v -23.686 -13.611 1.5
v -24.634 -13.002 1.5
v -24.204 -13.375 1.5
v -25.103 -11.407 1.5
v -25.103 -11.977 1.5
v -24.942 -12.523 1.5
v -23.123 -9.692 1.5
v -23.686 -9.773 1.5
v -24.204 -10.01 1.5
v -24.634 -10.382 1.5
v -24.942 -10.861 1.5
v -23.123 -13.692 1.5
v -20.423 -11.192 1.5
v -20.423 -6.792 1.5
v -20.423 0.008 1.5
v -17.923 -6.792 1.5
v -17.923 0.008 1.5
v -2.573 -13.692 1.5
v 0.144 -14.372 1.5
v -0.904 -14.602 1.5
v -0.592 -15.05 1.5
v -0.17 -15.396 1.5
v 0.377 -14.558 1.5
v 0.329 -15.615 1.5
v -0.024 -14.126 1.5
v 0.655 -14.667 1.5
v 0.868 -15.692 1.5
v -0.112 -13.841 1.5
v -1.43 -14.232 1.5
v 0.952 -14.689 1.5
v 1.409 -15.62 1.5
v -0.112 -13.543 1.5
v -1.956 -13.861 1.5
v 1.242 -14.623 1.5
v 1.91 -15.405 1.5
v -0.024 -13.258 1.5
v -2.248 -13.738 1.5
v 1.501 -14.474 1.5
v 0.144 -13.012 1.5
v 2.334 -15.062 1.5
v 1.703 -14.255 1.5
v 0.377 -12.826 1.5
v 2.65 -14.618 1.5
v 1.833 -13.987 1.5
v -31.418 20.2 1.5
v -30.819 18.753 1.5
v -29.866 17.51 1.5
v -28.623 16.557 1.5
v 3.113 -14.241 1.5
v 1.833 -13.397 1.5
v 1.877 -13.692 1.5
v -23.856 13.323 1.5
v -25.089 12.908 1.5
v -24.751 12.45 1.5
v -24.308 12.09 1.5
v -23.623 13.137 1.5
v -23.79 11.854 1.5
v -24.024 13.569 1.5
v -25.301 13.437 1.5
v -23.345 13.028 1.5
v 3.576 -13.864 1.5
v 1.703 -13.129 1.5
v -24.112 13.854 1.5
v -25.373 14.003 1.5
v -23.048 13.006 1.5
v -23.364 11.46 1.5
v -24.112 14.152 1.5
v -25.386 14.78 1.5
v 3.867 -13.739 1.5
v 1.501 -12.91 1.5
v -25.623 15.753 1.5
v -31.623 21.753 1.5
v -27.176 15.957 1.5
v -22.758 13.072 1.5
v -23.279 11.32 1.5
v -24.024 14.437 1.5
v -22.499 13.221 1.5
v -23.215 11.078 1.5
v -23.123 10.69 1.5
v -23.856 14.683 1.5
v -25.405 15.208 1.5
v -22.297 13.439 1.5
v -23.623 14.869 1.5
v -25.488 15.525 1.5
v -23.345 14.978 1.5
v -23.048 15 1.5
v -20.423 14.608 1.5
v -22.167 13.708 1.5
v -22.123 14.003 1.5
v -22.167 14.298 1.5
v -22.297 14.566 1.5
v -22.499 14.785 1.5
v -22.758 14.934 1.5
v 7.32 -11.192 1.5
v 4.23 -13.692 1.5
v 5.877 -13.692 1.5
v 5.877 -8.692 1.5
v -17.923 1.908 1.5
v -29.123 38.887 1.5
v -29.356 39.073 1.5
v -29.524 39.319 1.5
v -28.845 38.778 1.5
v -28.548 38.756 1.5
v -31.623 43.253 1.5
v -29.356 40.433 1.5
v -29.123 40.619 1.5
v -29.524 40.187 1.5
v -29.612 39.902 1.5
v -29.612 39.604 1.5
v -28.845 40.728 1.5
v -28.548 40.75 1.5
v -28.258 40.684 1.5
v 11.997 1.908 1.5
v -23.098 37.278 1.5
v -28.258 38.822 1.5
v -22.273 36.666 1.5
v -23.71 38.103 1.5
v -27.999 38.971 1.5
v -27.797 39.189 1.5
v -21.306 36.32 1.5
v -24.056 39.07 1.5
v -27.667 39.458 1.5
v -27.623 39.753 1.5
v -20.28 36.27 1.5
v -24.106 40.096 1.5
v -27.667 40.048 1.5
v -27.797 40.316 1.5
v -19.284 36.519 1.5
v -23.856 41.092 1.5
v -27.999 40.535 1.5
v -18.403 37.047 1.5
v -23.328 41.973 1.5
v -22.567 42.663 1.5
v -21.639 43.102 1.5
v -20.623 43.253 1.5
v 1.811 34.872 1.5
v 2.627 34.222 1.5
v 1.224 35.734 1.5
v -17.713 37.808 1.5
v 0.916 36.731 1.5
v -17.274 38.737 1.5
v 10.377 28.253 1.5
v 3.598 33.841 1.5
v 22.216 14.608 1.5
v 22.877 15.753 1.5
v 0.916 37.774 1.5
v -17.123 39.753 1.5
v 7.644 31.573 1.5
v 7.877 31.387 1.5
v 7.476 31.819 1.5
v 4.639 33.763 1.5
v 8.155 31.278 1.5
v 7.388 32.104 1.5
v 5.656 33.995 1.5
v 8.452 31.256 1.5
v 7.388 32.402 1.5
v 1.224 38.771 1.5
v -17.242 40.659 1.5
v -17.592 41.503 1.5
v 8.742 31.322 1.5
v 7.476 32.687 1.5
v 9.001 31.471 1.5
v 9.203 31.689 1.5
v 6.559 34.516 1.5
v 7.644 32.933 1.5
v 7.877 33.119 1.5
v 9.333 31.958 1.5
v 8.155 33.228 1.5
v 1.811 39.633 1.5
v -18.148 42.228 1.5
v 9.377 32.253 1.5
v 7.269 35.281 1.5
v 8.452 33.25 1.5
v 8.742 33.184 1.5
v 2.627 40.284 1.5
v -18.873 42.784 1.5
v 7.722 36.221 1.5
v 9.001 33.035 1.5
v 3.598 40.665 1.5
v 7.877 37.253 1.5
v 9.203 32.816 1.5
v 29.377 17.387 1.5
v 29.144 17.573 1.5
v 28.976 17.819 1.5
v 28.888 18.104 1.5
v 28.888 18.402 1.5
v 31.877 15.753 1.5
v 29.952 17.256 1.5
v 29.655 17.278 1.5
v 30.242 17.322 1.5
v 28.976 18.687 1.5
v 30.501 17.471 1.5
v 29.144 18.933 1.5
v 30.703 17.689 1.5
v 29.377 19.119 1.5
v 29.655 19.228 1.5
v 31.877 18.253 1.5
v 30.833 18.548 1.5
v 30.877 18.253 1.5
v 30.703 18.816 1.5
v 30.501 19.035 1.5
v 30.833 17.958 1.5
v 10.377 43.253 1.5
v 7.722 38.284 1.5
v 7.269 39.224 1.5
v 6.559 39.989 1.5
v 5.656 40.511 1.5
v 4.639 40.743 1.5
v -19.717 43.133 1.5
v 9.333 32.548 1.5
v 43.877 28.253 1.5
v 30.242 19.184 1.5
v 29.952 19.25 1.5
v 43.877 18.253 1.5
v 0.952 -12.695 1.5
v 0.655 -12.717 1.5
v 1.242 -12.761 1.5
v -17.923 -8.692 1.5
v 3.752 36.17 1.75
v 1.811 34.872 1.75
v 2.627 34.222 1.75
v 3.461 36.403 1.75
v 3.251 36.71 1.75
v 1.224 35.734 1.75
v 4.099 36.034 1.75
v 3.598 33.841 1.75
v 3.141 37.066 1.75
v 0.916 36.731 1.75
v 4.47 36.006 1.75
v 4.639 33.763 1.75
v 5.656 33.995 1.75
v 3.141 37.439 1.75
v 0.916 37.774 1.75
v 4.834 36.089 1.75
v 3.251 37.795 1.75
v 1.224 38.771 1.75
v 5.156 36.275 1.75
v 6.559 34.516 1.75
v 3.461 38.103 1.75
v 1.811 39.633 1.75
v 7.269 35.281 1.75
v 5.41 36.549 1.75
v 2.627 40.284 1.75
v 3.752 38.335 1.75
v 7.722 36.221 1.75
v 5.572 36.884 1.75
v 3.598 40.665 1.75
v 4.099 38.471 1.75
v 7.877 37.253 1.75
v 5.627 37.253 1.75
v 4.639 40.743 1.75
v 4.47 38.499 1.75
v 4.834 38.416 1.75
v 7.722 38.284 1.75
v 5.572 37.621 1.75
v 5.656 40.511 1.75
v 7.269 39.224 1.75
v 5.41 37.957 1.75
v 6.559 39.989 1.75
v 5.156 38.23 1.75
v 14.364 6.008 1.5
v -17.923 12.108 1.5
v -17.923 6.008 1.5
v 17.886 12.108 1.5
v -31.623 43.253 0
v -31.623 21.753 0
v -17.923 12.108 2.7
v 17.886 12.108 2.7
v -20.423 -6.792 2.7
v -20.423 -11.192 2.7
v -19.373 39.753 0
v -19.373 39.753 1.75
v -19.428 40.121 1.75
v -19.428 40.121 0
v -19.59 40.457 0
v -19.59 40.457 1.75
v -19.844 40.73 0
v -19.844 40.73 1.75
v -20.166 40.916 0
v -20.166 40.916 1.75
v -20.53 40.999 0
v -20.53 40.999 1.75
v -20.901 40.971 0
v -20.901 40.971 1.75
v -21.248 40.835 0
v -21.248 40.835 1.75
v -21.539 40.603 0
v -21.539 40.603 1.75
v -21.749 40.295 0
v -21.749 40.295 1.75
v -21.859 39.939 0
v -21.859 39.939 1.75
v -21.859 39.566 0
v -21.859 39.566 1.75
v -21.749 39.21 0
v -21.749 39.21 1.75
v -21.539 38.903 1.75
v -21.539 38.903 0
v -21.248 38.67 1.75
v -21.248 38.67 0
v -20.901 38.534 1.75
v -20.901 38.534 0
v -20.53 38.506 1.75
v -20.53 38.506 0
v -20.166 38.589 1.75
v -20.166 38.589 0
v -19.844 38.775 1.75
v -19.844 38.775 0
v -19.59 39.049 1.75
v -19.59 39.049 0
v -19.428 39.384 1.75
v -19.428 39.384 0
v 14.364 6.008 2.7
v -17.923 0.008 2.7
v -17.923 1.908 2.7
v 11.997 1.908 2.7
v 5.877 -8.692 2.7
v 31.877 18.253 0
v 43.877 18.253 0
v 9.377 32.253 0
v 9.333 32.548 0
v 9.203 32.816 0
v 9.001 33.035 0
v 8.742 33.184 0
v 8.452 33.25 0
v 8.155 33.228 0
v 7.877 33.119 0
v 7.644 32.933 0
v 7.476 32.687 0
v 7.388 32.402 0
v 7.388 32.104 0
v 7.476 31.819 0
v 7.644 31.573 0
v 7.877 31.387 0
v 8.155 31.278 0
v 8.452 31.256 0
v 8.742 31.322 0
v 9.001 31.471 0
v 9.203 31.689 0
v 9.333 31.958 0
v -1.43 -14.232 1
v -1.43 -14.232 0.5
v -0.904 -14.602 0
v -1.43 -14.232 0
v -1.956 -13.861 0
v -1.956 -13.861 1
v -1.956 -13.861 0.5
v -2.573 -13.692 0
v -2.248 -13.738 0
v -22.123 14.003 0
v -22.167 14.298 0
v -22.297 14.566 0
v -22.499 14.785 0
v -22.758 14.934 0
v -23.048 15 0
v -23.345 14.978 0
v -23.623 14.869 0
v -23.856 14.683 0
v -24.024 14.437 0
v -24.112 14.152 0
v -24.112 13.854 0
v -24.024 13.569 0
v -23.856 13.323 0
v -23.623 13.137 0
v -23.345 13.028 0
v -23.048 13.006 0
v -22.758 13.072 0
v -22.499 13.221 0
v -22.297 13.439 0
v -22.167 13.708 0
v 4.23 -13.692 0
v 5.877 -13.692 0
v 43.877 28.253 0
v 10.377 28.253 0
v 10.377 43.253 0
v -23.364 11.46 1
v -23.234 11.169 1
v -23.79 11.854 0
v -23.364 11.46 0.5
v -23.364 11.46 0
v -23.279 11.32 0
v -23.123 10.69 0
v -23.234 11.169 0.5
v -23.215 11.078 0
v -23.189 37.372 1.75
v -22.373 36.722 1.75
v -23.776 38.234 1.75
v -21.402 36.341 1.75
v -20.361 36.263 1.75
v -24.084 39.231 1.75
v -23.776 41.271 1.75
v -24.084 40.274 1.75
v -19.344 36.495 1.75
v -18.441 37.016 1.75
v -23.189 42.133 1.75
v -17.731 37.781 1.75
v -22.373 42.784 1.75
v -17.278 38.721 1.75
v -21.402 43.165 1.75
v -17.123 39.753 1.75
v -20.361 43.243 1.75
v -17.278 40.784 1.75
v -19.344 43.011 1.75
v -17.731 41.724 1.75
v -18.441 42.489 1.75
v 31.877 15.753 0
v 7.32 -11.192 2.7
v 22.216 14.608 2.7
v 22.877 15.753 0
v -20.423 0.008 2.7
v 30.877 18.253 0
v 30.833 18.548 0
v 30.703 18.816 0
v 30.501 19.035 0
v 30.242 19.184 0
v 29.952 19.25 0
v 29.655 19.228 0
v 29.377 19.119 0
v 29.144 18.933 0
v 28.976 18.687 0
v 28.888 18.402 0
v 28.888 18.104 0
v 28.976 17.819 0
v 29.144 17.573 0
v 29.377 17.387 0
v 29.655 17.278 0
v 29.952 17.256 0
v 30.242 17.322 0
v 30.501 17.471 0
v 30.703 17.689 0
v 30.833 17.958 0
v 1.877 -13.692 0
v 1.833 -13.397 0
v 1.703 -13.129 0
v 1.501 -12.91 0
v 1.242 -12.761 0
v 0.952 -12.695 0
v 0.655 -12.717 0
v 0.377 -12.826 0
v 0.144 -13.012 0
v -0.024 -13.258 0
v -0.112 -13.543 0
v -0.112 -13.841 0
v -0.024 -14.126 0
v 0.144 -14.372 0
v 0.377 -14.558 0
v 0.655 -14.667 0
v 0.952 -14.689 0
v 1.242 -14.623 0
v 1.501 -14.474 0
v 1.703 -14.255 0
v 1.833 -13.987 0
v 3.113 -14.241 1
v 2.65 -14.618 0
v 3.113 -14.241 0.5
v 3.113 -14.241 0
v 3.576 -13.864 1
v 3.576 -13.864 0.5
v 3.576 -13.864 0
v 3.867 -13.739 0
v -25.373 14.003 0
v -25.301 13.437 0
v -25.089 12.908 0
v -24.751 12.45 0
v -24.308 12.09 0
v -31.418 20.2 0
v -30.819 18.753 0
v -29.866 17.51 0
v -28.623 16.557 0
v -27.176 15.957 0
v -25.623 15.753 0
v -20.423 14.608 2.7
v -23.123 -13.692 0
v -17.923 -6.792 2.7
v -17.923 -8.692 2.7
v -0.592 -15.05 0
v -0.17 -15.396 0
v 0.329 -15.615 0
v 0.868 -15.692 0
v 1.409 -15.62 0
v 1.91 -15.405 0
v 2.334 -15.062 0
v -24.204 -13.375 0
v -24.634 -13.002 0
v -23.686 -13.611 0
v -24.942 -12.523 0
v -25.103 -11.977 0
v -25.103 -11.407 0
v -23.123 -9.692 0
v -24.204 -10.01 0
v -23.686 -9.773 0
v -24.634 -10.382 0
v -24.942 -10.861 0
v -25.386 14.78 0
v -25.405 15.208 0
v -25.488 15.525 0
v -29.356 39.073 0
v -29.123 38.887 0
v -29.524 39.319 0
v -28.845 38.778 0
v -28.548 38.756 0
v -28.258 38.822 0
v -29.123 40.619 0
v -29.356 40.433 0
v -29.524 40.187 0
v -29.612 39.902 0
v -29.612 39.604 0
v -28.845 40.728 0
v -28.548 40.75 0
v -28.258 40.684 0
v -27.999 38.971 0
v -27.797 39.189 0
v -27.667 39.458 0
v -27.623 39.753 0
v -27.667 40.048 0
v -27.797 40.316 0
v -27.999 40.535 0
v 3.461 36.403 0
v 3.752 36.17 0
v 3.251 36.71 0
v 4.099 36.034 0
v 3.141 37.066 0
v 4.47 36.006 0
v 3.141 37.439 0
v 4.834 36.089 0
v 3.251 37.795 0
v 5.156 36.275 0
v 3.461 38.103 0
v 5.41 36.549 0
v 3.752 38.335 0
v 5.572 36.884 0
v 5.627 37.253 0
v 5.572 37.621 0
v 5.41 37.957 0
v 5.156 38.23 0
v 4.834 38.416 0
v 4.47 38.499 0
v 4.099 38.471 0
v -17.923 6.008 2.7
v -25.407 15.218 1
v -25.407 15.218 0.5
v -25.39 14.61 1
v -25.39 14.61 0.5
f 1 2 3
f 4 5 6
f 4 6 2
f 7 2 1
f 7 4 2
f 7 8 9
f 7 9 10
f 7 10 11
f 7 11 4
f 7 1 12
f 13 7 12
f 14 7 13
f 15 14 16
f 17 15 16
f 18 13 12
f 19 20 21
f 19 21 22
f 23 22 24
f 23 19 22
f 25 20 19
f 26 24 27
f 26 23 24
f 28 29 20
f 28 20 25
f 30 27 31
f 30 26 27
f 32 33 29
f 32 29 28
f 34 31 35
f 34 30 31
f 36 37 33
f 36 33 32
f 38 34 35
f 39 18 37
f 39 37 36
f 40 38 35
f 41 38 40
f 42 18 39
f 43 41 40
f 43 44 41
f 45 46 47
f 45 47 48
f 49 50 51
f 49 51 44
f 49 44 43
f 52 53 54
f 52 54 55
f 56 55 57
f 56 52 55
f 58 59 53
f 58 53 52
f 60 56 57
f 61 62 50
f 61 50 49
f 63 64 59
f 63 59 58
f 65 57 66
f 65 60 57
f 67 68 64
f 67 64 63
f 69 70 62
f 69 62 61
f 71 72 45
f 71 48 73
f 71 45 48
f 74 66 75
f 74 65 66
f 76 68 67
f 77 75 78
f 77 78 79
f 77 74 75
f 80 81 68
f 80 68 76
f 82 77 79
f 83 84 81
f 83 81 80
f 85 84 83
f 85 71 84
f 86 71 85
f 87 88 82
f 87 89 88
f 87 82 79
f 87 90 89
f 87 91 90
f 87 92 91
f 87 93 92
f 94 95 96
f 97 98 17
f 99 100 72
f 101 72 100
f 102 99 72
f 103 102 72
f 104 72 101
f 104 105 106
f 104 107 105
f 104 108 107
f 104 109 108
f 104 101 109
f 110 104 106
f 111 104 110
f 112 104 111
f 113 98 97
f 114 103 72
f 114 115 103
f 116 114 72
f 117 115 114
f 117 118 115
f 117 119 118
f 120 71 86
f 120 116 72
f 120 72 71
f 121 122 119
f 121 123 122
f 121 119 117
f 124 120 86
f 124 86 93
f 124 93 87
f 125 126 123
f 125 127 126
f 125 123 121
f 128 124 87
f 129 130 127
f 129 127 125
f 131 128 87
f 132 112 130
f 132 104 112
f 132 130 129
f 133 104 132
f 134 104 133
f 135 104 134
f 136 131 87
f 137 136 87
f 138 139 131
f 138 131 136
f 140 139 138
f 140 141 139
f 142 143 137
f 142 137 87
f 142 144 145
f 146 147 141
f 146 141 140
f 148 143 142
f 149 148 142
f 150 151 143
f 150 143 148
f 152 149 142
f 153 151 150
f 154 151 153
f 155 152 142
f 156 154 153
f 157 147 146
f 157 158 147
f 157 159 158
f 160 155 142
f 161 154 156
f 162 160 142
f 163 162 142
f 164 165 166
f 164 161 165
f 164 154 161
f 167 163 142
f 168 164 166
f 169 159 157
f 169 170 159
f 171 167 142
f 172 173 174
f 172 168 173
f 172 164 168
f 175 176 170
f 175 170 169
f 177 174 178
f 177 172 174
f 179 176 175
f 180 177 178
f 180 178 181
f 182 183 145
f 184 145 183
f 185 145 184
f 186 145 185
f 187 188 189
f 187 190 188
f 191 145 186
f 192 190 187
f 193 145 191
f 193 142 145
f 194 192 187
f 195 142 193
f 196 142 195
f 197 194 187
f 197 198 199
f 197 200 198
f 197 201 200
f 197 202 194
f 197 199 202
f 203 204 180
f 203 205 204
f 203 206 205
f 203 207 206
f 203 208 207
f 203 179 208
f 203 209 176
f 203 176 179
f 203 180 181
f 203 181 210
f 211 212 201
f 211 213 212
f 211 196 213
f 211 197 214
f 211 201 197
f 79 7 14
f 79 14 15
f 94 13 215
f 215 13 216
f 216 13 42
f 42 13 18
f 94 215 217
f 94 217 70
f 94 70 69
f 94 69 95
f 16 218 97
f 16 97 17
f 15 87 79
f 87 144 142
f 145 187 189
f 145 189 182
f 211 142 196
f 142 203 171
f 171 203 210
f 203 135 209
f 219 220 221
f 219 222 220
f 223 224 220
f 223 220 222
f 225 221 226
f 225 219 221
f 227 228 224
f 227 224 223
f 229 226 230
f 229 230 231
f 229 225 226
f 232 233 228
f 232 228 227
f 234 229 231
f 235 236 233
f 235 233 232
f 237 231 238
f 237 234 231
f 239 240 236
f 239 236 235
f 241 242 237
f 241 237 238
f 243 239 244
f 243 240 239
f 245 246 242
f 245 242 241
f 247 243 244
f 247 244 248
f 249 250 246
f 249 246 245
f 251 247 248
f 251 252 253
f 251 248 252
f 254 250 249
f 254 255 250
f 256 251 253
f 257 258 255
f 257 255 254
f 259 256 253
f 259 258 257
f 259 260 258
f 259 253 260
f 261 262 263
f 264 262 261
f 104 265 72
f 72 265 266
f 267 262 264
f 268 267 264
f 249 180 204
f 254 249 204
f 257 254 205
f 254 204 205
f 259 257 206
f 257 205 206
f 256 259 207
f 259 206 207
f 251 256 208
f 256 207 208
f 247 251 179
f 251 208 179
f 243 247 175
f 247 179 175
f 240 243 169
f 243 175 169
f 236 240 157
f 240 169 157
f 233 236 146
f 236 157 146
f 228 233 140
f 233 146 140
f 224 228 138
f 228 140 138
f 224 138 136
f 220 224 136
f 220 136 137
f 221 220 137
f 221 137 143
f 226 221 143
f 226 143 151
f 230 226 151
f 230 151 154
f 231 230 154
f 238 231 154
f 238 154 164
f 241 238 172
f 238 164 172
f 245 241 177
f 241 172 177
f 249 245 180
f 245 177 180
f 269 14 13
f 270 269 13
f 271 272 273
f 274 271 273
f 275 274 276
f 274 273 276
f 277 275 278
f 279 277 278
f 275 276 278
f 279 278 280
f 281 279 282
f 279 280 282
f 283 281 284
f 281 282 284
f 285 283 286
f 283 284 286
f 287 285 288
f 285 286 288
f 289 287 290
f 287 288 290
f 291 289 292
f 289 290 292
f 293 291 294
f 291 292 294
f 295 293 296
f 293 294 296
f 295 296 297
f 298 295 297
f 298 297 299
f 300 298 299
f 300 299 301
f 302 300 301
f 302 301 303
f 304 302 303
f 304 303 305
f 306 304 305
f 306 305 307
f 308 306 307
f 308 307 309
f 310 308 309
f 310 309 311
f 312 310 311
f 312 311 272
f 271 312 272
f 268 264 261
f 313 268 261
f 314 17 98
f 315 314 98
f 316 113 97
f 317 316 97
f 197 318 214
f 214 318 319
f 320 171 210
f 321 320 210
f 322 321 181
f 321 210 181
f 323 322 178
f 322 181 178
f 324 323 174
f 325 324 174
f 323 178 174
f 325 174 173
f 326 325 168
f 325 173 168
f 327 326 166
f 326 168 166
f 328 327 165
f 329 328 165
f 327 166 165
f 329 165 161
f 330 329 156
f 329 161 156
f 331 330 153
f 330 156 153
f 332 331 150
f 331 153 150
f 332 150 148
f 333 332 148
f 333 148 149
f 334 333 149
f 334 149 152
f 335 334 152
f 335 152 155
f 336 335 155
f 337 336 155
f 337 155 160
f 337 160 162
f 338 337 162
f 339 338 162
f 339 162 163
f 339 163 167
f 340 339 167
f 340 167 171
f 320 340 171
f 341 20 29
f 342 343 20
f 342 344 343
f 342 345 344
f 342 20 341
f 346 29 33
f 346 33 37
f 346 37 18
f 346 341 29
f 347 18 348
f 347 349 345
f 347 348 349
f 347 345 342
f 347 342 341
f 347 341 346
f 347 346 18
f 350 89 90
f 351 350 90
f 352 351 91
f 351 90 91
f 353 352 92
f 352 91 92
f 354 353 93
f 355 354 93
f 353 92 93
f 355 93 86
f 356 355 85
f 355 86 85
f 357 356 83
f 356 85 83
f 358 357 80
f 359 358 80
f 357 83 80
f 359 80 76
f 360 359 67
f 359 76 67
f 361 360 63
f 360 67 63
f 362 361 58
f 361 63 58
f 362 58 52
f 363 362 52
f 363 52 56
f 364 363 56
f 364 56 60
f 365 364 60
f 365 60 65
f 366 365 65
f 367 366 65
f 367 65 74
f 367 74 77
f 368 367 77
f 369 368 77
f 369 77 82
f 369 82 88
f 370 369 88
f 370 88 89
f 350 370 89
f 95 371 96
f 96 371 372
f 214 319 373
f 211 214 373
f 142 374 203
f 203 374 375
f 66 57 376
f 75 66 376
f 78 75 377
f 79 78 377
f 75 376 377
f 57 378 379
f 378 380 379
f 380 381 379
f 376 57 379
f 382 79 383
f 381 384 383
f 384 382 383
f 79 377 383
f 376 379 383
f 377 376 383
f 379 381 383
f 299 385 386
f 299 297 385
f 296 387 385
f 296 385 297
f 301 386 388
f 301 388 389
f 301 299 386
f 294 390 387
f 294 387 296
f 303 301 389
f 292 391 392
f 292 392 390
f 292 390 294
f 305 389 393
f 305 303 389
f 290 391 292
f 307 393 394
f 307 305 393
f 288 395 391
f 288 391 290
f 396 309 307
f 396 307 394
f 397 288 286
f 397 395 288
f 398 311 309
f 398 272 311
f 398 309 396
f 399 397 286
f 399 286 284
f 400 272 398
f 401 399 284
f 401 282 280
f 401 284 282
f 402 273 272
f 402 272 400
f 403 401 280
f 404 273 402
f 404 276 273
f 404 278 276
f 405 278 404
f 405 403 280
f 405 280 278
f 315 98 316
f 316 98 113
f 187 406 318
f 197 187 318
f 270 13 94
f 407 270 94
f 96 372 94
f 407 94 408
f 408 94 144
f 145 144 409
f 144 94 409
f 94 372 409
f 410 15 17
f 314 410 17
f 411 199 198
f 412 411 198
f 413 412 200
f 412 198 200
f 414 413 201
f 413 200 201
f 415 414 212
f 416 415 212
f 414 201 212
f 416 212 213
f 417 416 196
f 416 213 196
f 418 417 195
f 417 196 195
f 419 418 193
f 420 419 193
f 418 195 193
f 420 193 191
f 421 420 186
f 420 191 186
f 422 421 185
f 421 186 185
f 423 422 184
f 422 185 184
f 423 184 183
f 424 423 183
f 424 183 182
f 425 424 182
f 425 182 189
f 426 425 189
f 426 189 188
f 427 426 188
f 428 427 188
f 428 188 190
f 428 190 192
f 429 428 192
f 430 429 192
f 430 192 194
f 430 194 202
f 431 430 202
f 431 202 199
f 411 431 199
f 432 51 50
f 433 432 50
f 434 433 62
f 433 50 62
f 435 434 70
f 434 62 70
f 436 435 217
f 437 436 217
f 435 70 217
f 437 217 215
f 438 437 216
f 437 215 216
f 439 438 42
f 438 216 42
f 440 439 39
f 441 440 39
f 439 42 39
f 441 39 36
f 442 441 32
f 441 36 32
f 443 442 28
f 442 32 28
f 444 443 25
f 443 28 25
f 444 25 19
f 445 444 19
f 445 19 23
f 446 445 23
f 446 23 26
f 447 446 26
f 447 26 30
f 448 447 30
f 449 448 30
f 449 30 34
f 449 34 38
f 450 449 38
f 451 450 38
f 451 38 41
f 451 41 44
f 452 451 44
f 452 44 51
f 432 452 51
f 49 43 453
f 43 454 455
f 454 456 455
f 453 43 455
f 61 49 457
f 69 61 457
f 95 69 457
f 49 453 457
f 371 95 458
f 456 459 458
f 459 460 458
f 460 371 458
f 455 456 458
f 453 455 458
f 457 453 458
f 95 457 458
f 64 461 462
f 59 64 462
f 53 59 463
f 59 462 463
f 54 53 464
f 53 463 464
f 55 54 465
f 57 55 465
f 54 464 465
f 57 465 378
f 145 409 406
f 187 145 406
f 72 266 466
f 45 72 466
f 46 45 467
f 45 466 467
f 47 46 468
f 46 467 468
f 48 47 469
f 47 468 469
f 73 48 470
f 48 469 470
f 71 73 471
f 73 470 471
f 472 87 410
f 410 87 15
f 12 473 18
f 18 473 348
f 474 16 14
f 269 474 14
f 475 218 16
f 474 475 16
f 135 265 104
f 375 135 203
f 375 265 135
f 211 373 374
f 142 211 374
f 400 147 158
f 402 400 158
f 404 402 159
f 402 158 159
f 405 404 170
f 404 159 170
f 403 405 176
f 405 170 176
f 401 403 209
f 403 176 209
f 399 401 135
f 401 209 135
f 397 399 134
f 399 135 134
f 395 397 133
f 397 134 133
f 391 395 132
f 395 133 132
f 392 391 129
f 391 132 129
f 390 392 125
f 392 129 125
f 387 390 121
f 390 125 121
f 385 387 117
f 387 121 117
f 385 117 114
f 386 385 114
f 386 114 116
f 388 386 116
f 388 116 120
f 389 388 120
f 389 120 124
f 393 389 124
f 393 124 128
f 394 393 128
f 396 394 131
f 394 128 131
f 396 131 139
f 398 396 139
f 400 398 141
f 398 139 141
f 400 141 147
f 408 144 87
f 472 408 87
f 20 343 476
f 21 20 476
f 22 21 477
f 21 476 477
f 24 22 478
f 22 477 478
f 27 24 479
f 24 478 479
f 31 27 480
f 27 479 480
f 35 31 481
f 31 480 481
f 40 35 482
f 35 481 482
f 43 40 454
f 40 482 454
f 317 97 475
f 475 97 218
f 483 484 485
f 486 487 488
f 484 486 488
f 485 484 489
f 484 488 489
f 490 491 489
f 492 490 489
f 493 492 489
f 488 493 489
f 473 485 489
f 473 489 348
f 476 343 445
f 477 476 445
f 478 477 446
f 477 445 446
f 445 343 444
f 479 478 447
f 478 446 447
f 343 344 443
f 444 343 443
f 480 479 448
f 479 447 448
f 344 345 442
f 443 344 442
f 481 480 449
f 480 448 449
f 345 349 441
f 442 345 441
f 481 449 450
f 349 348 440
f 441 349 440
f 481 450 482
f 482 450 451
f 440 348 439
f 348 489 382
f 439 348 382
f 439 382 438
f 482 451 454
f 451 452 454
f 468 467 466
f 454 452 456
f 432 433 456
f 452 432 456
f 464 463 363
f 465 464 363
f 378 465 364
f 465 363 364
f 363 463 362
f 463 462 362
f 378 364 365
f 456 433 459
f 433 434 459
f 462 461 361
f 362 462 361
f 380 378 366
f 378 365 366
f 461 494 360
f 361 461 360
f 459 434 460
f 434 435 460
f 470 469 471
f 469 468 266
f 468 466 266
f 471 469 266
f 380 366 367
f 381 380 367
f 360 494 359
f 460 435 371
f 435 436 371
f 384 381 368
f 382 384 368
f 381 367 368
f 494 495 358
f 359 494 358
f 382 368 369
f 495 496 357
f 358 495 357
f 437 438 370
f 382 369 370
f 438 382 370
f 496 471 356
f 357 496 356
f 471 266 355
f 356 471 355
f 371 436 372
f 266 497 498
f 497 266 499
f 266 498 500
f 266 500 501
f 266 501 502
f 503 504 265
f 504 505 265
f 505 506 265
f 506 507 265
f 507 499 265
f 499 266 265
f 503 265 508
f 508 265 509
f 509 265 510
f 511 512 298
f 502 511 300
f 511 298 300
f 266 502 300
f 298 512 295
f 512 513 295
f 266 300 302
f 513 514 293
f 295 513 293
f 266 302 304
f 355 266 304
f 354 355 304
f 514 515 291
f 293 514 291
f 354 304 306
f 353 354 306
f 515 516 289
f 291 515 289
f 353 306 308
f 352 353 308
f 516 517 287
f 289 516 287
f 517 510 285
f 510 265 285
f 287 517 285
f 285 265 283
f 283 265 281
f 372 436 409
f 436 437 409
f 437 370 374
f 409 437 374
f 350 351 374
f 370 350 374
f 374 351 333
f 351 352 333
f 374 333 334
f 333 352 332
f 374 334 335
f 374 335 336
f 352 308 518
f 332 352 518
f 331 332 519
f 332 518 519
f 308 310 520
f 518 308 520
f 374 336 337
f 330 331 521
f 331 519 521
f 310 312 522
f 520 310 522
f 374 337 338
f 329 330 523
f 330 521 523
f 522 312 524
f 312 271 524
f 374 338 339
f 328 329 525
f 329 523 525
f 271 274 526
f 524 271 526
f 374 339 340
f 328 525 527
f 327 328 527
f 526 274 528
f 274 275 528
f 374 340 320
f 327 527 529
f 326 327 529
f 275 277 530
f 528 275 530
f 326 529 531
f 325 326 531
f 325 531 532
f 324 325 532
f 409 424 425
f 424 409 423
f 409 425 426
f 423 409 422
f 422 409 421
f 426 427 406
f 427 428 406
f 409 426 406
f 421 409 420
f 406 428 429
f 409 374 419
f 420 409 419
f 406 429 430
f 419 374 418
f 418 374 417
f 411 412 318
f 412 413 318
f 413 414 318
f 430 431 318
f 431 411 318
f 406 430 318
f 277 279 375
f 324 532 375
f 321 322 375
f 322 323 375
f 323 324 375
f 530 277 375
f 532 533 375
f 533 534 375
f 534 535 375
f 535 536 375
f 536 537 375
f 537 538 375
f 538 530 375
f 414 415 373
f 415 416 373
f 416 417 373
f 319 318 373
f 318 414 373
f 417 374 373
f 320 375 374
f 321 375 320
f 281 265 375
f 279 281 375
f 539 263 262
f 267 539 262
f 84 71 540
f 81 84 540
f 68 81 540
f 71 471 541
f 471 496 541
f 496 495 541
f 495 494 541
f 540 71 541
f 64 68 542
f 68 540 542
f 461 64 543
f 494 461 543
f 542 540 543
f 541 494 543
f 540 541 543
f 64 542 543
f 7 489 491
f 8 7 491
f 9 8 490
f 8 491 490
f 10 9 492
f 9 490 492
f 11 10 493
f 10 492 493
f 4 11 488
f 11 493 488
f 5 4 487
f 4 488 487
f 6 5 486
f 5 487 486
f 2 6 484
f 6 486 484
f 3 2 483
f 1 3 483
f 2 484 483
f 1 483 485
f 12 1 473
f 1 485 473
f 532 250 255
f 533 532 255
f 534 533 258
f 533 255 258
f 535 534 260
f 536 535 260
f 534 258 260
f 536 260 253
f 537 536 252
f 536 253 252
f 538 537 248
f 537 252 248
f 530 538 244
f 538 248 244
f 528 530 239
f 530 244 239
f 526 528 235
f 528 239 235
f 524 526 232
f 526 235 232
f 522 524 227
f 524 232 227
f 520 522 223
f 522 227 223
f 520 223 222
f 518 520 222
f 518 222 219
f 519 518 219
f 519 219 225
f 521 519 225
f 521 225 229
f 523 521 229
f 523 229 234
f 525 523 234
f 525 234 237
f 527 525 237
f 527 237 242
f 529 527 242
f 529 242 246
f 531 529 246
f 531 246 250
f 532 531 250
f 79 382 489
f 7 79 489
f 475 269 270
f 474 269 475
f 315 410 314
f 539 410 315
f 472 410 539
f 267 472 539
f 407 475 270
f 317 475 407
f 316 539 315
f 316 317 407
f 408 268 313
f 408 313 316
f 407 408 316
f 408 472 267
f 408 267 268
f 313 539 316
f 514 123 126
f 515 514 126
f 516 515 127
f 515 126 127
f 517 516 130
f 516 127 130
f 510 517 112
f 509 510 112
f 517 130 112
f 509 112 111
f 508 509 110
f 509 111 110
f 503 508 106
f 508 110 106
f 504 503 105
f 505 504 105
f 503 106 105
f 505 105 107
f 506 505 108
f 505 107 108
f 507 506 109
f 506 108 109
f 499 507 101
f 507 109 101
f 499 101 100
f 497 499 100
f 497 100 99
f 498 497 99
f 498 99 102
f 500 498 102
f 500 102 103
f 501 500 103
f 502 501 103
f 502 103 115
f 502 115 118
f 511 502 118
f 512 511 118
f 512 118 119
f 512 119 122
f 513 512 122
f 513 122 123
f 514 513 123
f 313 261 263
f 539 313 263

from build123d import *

# Parameters (mm, degrees)
F0_W     = 42
F0_H     = 15
F1_DEPTH = 1.5
F2_R     = 3.5
F3_DEPTH = 0.25
F4_R     = 1.25
F5_DEPTH = 5
F6_R     = 1
F7_DEPTH = 5
F9_DEPTH = 1.2


with BuildPart() as f1:
    # F0 (on Top) → F1 (new body)
    with BuildSketch(Plane.XY):
        with Locations((-10.6229138038, 35.7527500853)):
            Rectangle(F0_W, F0_H)
        with BuildLine():
            Line((10.3770861962, 18.2527500853), (10.3770861962, 28.2527500853))
            Line((10.3770861962, 28.2527500853), (-31.6229138038, 28.2527500853))
            Line((-31.6229138038, 28.2527500853), (-31.6229138038, 21.7527500853))
            ThreePointArc((-31.6229138038, 21.7527500853), (-29.8655544909, 17.5101093982), (-25.6229138038, 15.7527500853))
            Line((-25.6229138038, 15.7527500853), (-24.5371273662, 15.7527500853))
            Line((-24.5371273662, 15.7527500853), (-23.1229138038, 15.7527500853))
            Line((-23.1229138038, 15.7527500853), (5.8770861962, 15.7527500853))
            Line((5.8770861962, 15.7527500853), (10.3770861962, 15.7527500853))
            Line((10.3770861962, 15.7527500853), (10.3770861962, 18.2527500853))
        make_face()
        Polygon((43.8770861962, 28.2527500853), (10.3770861962, 28.2527500853), (10.3770861962, 18.2527500853), (31.8770861962, 18.2527500853), (43.8770861962, 18.2527500853), align=None)
        Polygon((31.8770861962, 18.2527500853), (10.3770861962, 18.2527500853), (10.3770861962, 15.7527500853), (22.8770861962, 15.7527500853), (31.8770861962, 15.7527500853), align=None)
        Polygon((22.8770861962, 15.7527500853), (10.3770861962, 15.7527500853), (5.8770861962, 15.7527500853), (5.8770861962, -13.6921136433), align=None)
        Polygon((5.8770861962, -13.6921136433), (5.8770861962, 15.7527500853), (-23.1229138038, 15.7527500853), (-23.1229138038, 11.7527500853), (-23.1229138038, 10.6903063133), (-23.1229138038, -9.6921136433), (-23.1229138038, -13.6921136433), (-2.5732517242, -13.6921136433), (-1.1229138038, -13.6921136433), (2.8770861962, -13.6921136433), (4.2299595661, -13.6921136433), align=None)
        with BuildLine():
            Line((-24.5371273662, 15.7527500853), (-25.6229138038, 15.7527500853))
            add(Edge.make_bspline(
                [(-25.6229138038, 15.7527500853), (-25.2405945212, 15.277672559), (-25.4562471371, 14.5860834187), (-25.3729138038, 14.0027500853)],
                knots=[0, 0, 0, 0, 1.767766953, 1.767766953, 1.767766953, 1.767766953], degree=3))
            ThreePointArc((-25.3729138038, 14.0027500853), (-25.1532438897, 14.9724199994), (-24.5371273662, 15.7527500853))
        make_face()
        with BuildLine():
            Line((-23.1229138038, 11.7527500853), (-23.1229138038, 15.7527500853))
            Line((-23.1229138038, 15.7527500853), (-24.5371273662, 15.7527500853))
            ThreePointArc((-24.5371273662, 15.7527500853), (-25.1532438897, 14.9724199994), (-25.3729138038, 14.0027500853))
            ThreePointArc((-25.3729138038, 14.0027500853), (-24.934409558, 12.6682152852), (-23.7898176859, 11.8538575305))
            ThreePointArc((-23.7898176859, 11.8538575305), (-23.4601761288, 11.7781705466), (-23.1229138038, 11.7527500853))
        make_face()
        with BuildLine():
            Line((-23.1229138038, -13.6921136433), (-23.1229138038, -9.6921136433))
            ThreePointArc((-23.1229138038, -9.6921136433), (-25.1229138038, -11.6921136433), (-23.1229138038, -13.6921136433))
        make_face()
        with BuildLine():
            add(Edge.make_bspline(
                [(2.6500229876, -14.6176919133), (3.1772305838, -14.3094592572), (3.4171862062, -13.6921136433), (4.2299595661, -13.6921136433)],
                knots=[0, 0, 0, 0, 1.8310911299, 1.8310911299, 1.8310911299, 1.8310911299], degree=3))
            Line((4.2299595661, -13.6921136433), (2.8770861962, -13.6921136433))
            ThreePointArc((2.8770861962, -13.6921136433), (2.8194910951, -14.1686251423), (2.6500229876, -14.6176919133))
        make_face()
        with BuildLine():
            ThreePointArc((2.6500229876, -14.6176919133), (2.8194910951, -14.1686251423), (2.8770861962, -13.6921136433))
            Line((2.8770861962, -13.6921136433), (-1.1229138038, -13.6921136433))
            ThreePointArc((-1.1229138038, -13.6921136433), (-1.0673522064, -14.1602581707), (-0.9037545054, -14.6023918402))
            ThreePointArc((-0.9037545054, -14.6023918402), (0.8684756789, -15.692095108), (2.6500229876, -14.6176919133))
        make_face()
        with BuildLine():
            ThreePointArc((-0.9037545054, -14.6023918402), (-1.0673522064, -14.1602581707), (-1.1229138038, -13.6921136433))
            Line((-1.1229138038, -13.6921136433), (-2.5732517242, -13.6921136433))
            add(Edge.make_bspline(
                [(-0.9037545054, -14.6023918402), (-1.4608021595, -14.2992461823), (-1.8808895256, -13.6921136433), (-2.5732517242, -13.6921136433)],
                knots=[0, 0, 0, 0, 1.9015328973, 1.9015328973, 1.9015328973, 1.9015328973], degree=3))
        make_face()
        with BuildLine():
            Line((-23.1229138038, 10.6903063133), (-23.1229138038, 11.7527500853))
            ThreePointArc((-23.1229138038, 11.7527500853), (-23.4601761288, 11.7781705466), (-23.7898176859, 11.8538575305))
            add(Edge.make_bspline(
                [(-23.7898176859, 11.8538575305), (-23.1229138038, 11.3115124404), (-23.3172457665, 11.3592976704), (-23.1229138038, 10.6903063133)],
                knots=[0, 0, 0, 0, 1.3411234928, 1.3411234928, 1.3411234928, 1.3411234928], degree=3))
        make_face()
    extrude(amount=F1_DEPTH)

    # F2 (on face) → F3 (join)
    with BuildSketch(Plane.XY.offset(1.5)):
        with Locations((-20.6229138038, 39.7527500853)):
            Circle(F2_R)
        with Locations((4.3770861962, 37.2527500853)):
            Circle(F2_R)
    extrude(amount=F3_DEPTH)

    # F4 (on face) → F5 (cut)
    with BuildSketch(Plane.XY.offset(1.75)):
        with Locations((4.3770861962, 37.2527500853)):
            Circle(F4_R)
        with Locations((-20.6229138038, 39.7527500853)):
            Circle(F4_R)
    extrude(amount=-F5_DEPTH, mode=Mode.SUBTRACT)

    # F6 (on face) → F7 (cut)
    with BuildSketch(Plane.XY.offset(1.5)):
        with Locations((-28.6229138038, 39.7527500853)):
            Circle(F6_R)
        with Locations((8.3770861962, 32.2527500853)):
            Circle(F6_R)
        with Locations((29.8770861962, 18.2527500853)):
            Circle(F6_R)
        with Locations((-23.1229138038, 14.0027500853)):
            Circle(F6_R)
        with Locations((0.8770861962, -13.6921136433)):
            Circle(F6_R)
    extrude(amount=-F7_DEPTH, mode=Mode.SUBTRACT)

    # F8 (on face) → F9 (join)
    with BuildSketch(Plane.XY.offset(1.5)):
        Polygon((-17.9229138038, -6.7921136433), (-20.4229138038, -6.7921136433), (-20.4229138038, -11.1921136433), (7.3204618692, -11.1921136433), (22.2160988143, 14.6078863567), (-20.4229138038, 14.6078863567), (-20.4229138038, 0.0078863567), (-17.9229138038, 0.0078863567), (-17.9229138038, 1.9078863567), (11.9969990496, 1.9078863567), (5.8770861962, -8.6921136433), (-17.9229138038, -8.6921136433), align=None)
        Polygon((-17.9229138038, 6.0078863567), (-17.9229138038, 12.1078863567), (17.8859717953, 12.1078863567), (14.3641351533, 6.0078863567), align=None, mode=Mode.SUBTRACT)
    extrude(amount=F9_DEPTH)


solid = f1.part
